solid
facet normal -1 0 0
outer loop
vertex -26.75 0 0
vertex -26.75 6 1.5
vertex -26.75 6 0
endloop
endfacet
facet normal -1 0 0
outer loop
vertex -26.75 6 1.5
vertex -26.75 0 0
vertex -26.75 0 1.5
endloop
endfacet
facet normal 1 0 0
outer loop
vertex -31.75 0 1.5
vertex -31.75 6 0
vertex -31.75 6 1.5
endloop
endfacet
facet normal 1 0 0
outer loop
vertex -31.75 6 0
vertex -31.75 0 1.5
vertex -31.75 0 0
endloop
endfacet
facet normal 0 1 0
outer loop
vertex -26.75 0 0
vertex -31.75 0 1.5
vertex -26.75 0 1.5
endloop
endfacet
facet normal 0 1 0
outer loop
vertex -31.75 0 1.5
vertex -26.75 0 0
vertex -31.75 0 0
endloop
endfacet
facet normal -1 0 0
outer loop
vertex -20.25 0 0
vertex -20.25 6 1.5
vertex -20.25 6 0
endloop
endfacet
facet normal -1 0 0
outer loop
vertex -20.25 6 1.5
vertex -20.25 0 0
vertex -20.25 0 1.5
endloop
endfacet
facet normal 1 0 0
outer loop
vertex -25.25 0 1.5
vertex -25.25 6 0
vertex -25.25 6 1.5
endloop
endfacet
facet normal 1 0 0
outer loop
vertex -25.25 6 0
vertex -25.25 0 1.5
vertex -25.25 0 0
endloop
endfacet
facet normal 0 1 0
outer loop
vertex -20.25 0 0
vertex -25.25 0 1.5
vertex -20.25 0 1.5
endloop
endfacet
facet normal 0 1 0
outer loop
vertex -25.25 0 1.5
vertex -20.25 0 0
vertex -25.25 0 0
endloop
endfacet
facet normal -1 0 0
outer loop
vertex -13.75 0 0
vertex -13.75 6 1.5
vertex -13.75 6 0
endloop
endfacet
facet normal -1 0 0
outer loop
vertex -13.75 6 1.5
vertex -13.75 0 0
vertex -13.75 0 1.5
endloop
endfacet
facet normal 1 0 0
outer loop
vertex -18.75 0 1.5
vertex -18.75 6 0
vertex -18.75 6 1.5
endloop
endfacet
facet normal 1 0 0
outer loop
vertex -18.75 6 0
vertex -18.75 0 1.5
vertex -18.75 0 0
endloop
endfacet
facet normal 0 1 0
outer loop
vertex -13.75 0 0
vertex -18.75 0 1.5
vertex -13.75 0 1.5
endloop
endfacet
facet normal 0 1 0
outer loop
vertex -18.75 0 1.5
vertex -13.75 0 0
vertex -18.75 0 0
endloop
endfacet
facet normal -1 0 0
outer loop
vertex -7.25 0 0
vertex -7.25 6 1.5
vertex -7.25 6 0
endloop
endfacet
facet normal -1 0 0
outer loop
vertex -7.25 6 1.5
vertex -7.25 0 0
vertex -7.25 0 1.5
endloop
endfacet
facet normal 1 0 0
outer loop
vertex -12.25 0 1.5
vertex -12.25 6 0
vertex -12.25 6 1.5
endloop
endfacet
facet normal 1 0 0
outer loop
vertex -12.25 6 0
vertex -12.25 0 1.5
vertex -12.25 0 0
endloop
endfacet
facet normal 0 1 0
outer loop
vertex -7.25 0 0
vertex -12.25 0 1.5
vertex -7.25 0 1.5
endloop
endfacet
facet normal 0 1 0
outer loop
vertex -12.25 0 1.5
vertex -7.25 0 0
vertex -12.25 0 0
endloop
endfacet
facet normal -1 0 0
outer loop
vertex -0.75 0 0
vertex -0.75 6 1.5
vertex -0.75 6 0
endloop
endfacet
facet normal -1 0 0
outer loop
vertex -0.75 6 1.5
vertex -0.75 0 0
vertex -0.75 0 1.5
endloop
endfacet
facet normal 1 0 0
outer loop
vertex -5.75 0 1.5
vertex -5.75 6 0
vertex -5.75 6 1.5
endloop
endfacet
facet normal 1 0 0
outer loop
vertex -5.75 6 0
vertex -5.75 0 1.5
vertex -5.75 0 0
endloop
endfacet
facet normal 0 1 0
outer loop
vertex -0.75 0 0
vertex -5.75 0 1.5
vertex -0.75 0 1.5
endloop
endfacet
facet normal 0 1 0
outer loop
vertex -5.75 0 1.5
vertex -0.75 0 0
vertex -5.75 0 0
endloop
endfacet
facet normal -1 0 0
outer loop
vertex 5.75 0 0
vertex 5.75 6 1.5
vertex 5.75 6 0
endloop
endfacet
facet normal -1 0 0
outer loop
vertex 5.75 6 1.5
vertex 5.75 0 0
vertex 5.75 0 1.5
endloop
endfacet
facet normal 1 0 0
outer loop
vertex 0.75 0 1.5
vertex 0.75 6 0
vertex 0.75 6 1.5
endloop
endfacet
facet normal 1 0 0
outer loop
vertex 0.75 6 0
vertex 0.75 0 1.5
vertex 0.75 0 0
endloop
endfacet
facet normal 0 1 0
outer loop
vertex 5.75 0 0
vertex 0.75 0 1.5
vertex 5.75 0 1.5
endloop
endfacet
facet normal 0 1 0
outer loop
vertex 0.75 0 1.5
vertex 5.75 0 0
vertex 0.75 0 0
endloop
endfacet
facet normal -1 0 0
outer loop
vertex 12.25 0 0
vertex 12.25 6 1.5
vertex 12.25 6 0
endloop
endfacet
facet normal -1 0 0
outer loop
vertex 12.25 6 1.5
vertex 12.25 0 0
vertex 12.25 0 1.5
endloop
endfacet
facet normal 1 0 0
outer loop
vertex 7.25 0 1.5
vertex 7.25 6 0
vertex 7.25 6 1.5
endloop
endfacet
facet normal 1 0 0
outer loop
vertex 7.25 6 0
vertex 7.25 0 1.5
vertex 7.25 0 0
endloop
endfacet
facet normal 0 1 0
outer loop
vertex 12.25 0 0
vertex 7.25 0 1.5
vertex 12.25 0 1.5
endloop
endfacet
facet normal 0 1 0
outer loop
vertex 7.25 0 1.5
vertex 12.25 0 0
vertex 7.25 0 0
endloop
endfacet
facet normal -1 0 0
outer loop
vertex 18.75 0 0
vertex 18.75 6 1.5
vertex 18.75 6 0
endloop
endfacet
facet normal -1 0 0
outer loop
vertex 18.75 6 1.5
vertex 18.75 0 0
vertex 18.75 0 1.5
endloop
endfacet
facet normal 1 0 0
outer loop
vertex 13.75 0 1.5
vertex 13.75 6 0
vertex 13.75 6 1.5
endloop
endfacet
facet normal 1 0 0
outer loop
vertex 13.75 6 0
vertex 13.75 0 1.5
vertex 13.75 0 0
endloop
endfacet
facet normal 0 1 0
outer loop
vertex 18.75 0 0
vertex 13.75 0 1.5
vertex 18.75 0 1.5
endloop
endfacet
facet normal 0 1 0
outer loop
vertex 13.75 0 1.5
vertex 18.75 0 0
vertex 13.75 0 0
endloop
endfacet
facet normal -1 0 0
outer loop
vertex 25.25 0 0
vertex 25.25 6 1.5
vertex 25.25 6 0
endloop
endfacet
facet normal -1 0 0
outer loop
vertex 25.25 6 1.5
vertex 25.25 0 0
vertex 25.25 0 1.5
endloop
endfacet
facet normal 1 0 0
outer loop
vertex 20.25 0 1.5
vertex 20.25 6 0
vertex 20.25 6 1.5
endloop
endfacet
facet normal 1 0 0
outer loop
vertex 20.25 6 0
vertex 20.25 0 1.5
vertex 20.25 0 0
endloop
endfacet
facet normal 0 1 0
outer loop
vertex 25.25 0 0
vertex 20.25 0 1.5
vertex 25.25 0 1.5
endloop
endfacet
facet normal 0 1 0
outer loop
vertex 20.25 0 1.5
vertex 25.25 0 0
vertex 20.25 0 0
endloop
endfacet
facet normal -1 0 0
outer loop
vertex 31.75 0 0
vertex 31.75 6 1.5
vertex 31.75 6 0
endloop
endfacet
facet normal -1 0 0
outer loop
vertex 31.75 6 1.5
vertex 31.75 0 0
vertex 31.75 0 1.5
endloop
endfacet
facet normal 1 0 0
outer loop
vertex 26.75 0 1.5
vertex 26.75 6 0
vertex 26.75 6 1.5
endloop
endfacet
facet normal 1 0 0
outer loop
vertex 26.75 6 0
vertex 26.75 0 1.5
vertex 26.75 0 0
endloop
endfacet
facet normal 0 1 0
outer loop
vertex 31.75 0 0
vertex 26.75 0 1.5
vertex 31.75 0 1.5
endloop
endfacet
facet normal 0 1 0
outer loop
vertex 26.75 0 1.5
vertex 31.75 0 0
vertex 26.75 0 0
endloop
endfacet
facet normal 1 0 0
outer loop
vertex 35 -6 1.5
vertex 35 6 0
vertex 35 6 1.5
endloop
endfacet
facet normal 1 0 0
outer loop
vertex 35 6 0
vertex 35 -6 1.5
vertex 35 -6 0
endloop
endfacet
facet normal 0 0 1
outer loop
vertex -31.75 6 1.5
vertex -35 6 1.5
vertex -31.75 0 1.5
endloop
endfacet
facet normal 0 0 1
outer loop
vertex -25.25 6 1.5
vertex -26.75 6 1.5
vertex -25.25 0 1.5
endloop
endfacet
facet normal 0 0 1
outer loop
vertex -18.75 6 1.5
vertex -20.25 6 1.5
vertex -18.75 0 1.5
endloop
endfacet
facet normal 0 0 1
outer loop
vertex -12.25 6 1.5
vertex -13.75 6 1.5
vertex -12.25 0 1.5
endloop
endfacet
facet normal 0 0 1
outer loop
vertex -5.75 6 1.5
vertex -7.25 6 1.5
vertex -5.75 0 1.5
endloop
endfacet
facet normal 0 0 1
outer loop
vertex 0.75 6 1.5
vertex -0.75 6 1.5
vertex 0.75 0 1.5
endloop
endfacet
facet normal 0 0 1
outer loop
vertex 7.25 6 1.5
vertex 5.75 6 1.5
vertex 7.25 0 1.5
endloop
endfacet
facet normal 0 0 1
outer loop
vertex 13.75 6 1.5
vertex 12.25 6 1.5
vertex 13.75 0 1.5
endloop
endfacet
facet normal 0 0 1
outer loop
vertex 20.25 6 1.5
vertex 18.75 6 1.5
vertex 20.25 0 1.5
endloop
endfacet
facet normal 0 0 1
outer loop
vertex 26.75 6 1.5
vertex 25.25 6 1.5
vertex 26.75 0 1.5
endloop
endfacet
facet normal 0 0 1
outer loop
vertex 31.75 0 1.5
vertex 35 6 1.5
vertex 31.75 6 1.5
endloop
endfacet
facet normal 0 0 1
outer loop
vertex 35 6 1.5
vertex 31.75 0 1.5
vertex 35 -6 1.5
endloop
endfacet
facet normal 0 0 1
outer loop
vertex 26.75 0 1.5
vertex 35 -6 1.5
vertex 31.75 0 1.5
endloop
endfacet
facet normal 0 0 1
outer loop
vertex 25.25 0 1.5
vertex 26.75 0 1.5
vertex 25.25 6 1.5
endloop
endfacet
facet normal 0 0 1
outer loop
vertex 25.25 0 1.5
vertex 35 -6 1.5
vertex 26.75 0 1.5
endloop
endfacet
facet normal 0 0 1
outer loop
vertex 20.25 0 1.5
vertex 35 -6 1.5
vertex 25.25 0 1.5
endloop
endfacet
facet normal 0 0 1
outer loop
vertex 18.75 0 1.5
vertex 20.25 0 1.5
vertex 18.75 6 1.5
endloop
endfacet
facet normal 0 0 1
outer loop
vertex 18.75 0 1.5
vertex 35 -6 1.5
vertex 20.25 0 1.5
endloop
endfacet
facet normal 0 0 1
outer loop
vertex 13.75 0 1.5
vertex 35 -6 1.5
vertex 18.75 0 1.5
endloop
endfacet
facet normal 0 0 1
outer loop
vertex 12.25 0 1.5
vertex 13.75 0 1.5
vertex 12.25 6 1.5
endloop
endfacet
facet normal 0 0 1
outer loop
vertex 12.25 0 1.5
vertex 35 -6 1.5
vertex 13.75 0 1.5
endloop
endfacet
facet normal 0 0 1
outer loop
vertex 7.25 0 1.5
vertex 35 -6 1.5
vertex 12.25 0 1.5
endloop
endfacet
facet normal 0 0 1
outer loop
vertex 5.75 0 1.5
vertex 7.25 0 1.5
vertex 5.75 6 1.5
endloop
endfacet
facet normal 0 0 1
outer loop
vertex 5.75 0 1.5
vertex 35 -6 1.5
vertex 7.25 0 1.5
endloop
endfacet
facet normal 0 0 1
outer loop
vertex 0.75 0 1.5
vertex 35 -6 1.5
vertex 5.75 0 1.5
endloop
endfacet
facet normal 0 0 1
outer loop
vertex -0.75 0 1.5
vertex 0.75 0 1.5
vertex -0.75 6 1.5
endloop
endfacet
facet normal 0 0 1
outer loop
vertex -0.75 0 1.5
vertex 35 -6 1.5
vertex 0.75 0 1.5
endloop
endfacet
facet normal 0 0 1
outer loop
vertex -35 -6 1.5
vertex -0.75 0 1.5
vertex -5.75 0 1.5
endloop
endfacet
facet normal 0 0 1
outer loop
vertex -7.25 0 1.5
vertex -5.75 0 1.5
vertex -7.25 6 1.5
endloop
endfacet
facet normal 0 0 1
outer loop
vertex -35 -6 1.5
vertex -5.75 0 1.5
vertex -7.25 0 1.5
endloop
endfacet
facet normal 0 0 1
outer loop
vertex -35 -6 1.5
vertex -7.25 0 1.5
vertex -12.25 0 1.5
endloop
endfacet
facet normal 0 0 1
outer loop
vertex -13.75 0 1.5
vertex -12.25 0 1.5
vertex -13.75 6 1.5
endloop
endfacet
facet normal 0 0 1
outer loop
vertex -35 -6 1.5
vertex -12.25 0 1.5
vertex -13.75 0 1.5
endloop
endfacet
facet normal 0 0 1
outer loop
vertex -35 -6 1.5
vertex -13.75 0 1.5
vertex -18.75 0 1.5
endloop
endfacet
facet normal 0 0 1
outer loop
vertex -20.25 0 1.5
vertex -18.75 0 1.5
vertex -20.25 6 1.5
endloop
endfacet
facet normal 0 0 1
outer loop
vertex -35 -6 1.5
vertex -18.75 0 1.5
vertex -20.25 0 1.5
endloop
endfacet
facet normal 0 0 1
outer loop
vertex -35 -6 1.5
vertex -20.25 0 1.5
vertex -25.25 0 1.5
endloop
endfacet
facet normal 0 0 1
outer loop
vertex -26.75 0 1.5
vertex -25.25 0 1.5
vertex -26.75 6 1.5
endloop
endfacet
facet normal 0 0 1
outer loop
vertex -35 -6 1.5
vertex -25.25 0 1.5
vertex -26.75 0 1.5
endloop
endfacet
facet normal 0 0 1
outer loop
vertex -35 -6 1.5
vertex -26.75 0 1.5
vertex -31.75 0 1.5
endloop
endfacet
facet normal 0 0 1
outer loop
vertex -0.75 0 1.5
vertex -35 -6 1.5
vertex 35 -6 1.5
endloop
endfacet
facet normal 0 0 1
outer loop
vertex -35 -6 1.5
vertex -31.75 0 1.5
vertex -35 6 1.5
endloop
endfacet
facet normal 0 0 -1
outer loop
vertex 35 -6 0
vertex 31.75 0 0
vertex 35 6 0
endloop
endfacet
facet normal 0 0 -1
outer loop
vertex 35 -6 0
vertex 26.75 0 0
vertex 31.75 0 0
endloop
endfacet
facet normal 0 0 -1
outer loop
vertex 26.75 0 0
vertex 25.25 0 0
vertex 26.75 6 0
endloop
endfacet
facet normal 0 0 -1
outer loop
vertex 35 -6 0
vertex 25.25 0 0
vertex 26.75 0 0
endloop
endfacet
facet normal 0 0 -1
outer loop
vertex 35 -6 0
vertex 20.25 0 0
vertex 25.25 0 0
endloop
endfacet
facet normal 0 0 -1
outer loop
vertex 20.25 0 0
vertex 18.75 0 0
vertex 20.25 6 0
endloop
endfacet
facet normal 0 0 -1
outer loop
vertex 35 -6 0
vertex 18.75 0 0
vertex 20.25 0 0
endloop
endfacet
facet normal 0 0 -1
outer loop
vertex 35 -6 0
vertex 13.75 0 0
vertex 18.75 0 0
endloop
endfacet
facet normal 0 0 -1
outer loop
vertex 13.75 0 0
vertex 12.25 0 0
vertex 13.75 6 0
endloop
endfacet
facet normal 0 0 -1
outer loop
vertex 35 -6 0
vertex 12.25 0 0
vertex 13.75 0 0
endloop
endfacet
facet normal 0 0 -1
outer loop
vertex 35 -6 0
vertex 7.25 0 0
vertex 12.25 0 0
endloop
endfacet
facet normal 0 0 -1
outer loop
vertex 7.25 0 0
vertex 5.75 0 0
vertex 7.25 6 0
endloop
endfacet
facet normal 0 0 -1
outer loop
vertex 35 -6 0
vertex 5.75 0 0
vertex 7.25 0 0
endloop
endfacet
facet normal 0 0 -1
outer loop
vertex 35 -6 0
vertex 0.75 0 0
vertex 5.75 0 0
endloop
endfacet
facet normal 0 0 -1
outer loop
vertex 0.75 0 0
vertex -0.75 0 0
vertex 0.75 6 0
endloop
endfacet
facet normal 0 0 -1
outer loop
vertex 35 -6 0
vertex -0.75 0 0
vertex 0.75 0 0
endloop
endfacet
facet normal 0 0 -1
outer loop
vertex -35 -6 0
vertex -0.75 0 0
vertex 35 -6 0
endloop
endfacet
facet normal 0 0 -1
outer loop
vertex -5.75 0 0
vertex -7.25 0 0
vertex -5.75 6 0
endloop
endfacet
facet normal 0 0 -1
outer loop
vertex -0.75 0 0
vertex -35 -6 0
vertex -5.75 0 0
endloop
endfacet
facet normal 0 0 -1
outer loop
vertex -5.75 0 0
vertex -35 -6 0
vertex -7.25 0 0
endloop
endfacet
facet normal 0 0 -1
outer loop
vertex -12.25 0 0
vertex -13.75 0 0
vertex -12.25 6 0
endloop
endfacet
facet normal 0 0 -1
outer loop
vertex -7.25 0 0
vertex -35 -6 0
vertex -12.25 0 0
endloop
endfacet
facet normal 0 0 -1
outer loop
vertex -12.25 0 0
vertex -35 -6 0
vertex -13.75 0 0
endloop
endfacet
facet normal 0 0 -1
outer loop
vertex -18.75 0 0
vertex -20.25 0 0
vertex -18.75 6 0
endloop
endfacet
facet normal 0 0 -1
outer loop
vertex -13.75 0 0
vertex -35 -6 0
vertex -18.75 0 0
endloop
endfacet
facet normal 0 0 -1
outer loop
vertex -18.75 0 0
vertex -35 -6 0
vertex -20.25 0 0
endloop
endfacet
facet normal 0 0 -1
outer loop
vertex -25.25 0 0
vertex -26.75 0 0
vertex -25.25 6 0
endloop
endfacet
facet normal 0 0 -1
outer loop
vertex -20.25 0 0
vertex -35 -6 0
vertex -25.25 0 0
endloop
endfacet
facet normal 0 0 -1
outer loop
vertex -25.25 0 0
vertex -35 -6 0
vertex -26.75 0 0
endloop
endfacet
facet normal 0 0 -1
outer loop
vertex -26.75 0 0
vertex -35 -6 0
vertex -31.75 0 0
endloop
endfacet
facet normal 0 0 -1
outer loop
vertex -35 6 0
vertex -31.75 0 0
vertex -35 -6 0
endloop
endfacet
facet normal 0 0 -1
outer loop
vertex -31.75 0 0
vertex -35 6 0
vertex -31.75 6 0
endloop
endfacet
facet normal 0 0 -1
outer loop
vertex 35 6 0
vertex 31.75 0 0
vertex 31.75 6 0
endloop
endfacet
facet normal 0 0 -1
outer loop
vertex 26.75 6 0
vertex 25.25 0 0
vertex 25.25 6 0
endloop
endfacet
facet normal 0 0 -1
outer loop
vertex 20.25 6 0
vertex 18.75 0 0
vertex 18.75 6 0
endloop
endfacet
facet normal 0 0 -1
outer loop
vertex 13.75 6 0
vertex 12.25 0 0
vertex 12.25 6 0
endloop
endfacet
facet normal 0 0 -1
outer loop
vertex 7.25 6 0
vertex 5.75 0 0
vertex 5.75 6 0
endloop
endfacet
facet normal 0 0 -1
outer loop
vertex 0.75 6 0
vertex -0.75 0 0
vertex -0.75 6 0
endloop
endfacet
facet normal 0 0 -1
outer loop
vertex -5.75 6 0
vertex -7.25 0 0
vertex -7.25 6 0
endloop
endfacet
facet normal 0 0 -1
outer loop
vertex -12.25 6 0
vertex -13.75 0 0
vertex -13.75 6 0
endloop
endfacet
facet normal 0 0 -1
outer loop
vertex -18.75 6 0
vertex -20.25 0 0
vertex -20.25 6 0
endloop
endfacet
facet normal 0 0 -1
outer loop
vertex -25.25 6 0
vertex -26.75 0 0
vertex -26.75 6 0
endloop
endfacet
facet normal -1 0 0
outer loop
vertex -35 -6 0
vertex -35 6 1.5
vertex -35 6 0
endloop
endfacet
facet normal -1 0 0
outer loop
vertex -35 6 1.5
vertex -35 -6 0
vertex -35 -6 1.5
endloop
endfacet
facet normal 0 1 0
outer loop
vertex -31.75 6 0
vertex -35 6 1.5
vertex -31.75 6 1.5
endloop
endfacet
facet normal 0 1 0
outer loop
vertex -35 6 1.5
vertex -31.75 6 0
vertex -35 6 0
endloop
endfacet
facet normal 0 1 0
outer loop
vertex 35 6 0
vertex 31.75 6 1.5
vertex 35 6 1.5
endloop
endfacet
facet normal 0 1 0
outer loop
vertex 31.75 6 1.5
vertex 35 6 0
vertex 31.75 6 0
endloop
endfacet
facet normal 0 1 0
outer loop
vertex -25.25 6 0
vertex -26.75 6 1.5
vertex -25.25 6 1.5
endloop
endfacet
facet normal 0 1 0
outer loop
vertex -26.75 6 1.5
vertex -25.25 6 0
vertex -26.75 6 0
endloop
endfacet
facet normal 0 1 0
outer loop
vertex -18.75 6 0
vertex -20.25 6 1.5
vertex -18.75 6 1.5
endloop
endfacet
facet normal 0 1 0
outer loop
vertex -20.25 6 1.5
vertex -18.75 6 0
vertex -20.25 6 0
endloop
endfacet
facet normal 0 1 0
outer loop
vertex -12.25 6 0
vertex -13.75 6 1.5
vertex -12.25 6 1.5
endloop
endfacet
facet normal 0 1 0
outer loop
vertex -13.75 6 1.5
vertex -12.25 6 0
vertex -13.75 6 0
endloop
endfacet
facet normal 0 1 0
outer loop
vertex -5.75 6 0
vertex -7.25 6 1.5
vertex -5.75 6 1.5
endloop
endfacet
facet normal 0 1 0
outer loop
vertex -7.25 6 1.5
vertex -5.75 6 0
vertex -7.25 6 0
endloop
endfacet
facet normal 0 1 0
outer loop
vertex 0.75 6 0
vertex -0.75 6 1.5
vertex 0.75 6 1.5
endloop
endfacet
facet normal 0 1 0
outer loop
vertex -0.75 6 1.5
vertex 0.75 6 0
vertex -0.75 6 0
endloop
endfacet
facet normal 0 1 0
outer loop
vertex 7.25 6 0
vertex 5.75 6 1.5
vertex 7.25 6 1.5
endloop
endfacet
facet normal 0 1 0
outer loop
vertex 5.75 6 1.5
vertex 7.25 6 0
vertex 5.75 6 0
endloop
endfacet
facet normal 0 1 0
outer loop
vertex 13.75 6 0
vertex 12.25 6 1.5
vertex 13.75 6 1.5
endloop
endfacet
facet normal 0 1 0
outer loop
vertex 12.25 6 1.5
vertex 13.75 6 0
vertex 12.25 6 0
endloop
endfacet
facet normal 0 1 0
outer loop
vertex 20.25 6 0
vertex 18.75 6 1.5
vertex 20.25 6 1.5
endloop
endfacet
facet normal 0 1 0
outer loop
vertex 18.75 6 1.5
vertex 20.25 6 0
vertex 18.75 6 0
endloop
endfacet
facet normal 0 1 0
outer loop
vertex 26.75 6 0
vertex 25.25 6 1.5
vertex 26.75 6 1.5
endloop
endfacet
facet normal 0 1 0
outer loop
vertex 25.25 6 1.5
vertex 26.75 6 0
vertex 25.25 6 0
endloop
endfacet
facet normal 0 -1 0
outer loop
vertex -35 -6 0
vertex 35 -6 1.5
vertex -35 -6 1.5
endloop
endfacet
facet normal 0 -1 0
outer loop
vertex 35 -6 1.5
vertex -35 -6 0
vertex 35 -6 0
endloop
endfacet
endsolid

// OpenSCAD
// 10-well comb for agarose gel casting, printed lying flat
// Units: mm

// ---- Spine ----
spine_len   = 70;   // spine length along X
spine_wid   = 12;   // spine width along Y
spine_thk   = 1.5;  // plate thickness along Z

// ---- Teeth ----
tooth_count = 10;   // number of wells
tooth_wid   = 5.0;  // tooth width along X
tooth_len   = 12;   // tooth length along Y (overlaps spine)
gap         = 1.5;  // gap between neighbouring teeth

// ---- Misc ----
eps         = 0.01; // cut overlap
$fn         = 64;

// Derived
pitch   = tooth_wid + gap;
x_start = -(tooth_count - 1) * pitch / 2;  // row centred on origin

difference() {
    // Base plate (spine + teeth area)
    translate([-spine_len / 2, -tooth_len / 2, 0])
        cube([spine_len, tooth_len, spine_thk]);

    // Cut out teeth (leaving the back bar intact)
    for (i = [0 : tooth_count - 1])
        translate([x_start + i * pitch - tooth_wid / 2, 0, -eps])
            cube([tooth_wid, tooth_len + 2 * eps, spine_thk + 2 * eps]);
}
